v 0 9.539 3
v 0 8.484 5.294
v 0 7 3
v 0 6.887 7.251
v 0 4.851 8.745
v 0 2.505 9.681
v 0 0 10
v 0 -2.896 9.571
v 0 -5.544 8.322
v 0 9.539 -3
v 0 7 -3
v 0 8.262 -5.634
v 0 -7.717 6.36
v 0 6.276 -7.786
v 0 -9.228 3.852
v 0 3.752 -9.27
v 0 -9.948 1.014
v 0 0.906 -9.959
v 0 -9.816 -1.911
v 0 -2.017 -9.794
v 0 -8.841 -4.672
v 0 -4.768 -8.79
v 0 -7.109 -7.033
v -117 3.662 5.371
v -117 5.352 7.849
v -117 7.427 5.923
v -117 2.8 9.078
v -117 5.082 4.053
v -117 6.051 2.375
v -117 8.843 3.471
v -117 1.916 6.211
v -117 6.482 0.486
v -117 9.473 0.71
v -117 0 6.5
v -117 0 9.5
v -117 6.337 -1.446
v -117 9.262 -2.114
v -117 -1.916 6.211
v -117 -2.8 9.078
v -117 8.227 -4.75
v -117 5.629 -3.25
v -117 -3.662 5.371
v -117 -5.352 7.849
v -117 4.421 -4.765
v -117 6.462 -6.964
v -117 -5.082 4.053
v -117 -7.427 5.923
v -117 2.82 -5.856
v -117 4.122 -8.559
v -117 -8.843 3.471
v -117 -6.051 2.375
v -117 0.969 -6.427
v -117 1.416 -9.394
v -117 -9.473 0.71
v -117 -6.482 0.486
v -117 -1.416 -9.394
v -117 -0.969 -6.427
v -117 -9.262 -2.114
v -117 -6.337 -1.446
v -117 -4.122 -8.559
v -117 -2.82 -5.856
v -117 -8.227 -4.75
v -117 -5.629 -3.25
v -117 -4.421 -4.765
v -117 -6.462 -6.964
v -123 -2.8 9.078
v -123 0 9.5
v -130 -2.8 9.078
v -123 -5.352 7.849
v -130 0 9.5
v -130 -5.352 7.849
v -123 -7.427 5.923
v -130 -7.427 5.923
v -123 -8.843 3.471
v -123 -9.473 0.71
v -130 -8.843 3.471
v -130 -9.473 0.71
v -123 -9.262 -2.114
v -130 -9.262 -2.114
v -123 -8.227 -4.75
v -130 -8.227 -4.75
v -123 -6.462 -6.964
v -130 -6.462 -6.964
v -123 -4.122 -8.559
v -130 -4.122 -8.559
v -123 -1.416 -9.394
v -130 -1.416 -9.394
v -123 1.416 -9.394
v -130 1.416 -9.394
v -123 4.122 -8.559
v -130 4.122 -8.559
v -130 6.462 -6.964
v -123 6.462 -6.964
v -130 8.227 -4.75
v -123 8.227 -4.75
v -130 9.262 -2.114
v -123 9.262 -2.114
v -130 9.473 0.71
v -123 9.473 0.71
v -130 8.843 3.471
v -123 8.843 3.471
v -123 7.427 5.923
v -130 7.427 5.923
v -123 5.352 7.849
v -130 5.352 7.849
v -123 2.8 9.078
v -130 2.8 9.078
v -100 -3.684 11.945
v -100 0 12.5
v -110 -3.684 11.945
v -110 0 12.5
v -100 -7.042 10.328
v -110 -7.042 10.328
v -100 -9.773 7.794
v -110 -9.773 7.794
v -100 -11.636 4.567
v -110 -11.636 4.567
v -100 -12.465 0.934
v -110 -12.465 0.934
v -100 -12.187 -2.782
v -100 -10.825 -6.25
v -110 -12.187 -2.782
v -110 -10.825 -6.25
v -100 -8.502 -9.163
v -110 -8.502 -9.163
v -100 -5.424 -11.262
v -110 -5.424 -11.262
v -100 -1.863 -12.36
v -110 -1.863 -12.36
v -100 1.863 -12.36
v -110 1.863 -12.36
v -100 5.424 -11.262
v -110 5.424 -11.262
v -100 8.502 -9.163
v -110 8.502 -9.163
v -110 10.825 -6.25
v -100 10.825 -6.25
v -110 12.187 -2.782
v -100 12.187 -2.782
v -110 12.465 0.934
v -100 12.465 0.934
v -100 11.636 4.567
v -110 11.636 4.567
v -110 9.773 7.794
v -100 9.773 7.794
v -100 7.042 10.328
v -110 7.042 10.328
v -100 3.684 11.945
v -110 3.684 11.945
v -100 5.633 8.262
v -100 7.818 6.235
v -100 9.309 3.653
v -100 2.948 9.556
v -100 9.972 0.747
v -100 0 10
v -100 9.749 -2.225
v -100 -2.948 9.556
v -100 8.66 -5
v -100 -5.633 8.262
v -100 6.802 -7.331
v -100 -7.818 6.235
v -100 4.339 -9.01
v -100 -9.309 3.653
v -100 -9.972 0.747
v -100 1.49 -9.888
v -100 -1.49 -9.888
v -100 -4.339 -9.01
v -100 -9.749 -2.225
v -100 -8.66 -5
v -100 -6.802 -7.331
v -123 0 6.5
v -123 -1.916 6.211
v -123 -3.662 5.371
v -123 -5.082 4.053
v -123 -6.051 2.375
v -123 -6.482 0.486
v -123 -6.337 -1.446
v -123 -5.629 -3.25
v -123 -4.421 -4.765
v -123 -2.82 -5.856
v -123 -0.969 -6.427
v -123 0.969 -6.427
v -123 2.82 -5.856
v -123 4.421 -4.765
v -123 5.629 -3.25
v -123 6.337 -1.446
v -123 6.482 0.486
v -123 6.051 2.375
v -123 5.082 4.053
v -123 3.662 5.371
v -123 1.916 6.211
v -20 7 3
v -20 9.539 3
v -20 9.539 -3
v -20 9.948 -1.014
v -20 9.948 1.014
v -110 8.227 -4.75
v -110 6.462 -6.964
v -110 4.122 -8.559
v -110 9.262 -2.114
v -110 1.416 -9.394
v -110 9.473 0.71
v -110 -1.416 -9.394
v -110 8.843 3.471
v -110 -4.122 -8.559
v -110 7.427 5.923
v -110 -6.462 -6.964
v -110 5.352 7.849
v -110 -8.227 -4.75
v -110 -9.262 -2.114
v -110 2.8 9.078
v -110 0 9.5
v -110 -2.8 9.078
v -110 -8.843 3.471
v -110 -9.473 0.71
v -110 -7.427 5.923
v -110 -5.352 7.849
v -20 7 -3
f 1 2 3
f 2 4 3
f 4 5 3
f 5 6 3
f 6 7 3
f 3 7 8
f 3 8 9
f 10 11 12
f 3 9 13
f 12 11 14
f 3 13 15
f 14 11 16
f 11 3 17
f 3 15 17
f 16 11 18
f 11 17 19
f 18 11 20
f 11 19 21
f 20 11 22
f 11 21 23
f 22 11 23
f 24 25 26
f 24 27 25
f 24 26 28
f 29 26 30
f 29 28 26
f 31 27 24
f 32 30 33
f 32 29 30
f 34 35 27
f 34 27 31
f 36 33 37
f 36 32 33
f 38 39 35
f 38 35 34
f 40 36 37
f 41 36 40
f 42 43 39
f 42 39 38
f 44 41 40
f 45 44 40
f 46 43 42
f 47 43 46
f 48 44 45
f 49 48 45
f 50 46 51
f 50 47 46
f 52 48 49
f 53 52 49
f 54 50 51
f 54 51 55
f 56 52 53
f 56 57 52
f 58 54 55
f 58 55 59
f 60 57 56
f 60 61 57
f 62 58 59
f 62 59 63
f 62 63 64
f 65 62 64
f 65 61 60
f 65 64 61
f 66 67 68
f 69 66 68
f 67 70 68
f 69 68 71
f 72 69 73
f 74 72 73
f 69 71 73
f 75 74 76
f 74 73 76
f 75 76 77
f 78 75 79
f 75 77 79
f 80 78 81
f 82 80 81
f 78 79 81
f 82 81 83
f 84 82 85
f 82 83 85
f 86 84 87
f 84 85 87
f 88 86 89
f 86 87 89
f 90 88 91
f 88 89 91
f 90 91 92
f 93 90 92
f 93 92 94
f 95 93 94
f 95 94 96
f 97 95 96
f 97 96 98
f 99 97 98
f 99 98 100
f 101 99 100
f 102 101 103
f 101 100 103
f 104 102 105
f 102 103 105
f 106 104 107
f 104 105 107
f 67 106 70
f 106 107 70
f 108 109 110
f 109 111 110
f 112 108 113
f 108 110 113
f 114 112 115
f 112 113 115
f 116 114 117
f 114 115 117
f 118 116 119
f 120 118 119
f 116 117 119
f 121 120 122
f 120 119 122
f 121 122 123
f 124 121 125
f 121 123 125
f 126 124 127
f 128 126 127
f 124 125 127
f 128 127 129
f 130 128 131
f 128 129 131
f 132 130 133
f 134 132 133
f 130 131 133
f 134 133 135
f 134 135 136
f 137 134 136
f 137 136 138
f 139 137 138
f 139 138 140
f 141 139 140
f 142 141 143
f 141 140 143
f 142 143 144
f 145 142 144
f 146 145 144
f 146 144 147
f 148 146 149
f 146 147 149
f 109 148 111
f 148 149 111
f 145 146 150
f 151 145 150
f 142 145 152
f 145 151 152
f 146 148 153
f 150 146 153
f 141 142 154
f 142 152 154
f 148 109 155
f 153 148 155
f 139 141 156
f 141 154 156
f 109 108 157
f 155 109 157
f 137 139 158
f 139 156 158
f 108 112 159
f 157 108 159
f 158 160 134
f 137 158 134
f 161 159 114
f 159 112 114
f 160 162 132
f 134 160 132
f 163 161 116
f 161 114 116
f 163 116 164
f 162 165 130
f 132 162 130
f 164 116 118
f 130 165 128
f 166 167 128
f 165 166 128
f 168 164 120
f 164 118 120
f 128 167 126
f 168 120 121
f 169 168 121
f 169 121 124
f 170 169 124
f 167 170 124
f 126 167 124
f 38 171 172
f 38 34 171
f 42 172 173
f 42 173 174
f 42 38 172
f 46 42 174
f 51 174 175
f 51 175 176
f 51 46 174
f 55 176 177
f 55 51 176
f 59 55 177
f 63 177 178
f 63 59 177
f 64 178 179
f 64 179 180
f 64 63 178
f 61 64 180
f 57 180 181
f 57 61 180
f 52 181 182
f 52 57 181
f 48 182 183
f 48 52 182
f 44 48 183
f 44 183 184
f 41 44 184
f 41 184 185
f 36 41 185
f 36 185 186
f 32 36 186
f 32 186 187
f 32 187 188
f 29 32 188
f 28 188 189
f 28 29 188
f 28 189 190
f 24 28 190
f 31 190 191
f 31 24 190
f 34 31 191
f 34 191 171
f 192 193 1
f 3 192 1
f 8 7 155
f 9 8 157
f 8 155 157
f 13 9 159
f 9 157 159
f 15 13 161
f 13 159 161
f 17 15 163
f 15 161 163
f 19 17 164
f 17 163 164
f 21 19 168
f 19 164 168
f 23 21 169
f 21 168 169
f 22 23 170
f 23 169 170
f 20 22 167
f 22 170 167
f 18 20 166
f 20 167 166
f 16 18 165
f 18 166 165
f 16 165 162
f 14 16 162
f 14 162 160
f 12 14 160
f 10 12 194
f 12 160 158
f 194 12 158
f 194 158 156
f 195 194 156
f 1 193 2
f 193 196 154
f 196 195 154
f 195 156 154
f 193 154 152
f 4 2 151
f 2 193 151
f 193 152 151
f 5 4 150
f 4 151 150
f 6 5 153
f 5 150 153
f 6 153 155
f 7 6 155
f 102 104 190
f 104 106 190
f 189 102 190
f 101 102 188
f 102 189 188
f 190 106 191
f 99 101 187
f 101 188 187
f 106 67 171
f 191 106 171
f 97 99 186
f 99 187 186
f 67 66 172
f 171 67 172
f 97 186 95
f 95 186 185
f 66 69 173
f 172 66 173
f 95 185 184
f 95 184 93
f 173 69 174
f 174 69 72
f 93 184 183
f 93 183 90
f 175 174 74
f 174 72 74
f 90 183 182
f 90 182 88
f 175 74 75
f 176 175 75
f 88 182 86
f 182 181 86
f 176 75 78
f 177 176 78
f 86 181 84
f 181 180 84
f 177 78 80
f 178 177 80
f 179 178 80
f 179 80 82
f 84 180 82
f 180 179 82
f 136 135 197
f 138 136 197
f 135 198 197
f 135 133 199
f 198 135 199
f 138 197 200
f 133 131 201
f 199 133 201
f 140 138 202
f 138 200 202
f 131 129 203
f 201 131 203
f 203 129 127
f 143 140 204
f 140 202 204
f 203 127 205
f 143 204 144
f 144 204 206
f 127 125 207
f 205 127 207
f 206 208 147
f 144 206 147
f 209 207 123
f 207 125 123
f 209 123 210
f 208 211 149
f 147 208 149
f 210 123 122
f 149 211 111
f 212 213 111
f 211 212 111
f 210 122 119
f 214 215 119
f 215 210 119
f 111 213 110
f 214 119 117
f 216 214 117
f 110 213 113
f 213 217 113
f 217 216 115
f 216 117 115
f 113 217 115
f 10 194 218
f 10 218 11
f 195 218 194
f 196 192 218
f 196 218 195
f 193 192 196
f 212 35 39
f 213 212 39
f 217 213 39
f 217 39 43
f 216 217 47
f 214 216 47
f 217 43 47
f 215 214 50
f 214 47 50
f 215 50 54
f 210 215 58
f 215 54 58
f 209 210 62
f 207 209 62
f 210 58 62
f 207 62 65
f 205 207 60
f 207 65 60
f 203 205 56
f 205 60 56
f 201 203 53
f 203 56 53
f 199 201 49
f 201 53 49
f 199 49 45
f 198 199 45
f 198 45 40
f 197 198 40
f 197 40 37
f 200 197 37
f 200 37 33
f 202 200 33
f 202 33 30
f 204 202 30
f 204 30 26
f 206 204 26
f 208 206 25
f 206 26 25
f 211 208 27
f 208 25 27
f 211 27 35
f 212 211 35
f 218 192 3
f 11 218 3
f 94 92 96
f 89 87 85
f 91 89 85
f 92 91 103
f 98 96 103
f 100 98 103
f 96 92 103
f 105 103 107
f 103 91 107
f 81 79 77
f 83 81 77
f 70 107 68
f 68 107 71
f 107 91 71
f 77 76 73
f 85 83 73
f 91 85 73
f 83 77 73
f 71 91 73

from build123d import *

# Parameters (mm, degrees)
IZIM3_W               = 6
IZIM3_H               = 3
IZIM4_W               = 20
IZIM4_H               = 5
KES_EKSTR_ZYON1_DEPTH = 3


with BuildPart() as part:
    # Çizim2 → Döndür1 (revolve)
    with BuildSketch(Plane.XY, mode=Mode.PRIVATE) as d_nd_r1_sk:
        Polygon((0, 0), (0, 10), (-100, 10), (-100, 12.5), (-110, 12.5), (-110, 9.5), (-130, 9.5), (-130, 0), align=None)
    revolve(d_nd_r1_sk.sketch.rotate(Axis((-130, 0, 0), (1, 0, 0)), 90), axis=Axis((-130, 0, 0), (1, 0, 0)))

    # Çizim3 → Kes-Döndür1 (revolve, cut)
    with BuildSketch(Plane.XY, mode=Mode.PRIVATE) as kes_d_nd_r1_sk:
        with Locations((-120, 8)):
            Rectangle(IZIM3_W, IZIM3_H)
    revolve(kes_d_nd_r1_sk.sketch.rotate(Axis((-130, 0, 0), (1, 0, 0)), 90), axis=Axis((-130, 0, 0), (1, 0, 0)), mode=Mode.SUBTRACT)

    # Çizim4 → Kes-Ekstrüzyon1 (cut, symmetric)
    with BuildSketch(Plane.XY):
        with Locations((-10, 9.5)):
            Rectangle(IZIM4_W, IZIM4_H)
    extrude(amount=KES_EKSTR_ZYON1_DEPTH, both=True, mode=Mode.SUBTRACT)


solid = part.part
